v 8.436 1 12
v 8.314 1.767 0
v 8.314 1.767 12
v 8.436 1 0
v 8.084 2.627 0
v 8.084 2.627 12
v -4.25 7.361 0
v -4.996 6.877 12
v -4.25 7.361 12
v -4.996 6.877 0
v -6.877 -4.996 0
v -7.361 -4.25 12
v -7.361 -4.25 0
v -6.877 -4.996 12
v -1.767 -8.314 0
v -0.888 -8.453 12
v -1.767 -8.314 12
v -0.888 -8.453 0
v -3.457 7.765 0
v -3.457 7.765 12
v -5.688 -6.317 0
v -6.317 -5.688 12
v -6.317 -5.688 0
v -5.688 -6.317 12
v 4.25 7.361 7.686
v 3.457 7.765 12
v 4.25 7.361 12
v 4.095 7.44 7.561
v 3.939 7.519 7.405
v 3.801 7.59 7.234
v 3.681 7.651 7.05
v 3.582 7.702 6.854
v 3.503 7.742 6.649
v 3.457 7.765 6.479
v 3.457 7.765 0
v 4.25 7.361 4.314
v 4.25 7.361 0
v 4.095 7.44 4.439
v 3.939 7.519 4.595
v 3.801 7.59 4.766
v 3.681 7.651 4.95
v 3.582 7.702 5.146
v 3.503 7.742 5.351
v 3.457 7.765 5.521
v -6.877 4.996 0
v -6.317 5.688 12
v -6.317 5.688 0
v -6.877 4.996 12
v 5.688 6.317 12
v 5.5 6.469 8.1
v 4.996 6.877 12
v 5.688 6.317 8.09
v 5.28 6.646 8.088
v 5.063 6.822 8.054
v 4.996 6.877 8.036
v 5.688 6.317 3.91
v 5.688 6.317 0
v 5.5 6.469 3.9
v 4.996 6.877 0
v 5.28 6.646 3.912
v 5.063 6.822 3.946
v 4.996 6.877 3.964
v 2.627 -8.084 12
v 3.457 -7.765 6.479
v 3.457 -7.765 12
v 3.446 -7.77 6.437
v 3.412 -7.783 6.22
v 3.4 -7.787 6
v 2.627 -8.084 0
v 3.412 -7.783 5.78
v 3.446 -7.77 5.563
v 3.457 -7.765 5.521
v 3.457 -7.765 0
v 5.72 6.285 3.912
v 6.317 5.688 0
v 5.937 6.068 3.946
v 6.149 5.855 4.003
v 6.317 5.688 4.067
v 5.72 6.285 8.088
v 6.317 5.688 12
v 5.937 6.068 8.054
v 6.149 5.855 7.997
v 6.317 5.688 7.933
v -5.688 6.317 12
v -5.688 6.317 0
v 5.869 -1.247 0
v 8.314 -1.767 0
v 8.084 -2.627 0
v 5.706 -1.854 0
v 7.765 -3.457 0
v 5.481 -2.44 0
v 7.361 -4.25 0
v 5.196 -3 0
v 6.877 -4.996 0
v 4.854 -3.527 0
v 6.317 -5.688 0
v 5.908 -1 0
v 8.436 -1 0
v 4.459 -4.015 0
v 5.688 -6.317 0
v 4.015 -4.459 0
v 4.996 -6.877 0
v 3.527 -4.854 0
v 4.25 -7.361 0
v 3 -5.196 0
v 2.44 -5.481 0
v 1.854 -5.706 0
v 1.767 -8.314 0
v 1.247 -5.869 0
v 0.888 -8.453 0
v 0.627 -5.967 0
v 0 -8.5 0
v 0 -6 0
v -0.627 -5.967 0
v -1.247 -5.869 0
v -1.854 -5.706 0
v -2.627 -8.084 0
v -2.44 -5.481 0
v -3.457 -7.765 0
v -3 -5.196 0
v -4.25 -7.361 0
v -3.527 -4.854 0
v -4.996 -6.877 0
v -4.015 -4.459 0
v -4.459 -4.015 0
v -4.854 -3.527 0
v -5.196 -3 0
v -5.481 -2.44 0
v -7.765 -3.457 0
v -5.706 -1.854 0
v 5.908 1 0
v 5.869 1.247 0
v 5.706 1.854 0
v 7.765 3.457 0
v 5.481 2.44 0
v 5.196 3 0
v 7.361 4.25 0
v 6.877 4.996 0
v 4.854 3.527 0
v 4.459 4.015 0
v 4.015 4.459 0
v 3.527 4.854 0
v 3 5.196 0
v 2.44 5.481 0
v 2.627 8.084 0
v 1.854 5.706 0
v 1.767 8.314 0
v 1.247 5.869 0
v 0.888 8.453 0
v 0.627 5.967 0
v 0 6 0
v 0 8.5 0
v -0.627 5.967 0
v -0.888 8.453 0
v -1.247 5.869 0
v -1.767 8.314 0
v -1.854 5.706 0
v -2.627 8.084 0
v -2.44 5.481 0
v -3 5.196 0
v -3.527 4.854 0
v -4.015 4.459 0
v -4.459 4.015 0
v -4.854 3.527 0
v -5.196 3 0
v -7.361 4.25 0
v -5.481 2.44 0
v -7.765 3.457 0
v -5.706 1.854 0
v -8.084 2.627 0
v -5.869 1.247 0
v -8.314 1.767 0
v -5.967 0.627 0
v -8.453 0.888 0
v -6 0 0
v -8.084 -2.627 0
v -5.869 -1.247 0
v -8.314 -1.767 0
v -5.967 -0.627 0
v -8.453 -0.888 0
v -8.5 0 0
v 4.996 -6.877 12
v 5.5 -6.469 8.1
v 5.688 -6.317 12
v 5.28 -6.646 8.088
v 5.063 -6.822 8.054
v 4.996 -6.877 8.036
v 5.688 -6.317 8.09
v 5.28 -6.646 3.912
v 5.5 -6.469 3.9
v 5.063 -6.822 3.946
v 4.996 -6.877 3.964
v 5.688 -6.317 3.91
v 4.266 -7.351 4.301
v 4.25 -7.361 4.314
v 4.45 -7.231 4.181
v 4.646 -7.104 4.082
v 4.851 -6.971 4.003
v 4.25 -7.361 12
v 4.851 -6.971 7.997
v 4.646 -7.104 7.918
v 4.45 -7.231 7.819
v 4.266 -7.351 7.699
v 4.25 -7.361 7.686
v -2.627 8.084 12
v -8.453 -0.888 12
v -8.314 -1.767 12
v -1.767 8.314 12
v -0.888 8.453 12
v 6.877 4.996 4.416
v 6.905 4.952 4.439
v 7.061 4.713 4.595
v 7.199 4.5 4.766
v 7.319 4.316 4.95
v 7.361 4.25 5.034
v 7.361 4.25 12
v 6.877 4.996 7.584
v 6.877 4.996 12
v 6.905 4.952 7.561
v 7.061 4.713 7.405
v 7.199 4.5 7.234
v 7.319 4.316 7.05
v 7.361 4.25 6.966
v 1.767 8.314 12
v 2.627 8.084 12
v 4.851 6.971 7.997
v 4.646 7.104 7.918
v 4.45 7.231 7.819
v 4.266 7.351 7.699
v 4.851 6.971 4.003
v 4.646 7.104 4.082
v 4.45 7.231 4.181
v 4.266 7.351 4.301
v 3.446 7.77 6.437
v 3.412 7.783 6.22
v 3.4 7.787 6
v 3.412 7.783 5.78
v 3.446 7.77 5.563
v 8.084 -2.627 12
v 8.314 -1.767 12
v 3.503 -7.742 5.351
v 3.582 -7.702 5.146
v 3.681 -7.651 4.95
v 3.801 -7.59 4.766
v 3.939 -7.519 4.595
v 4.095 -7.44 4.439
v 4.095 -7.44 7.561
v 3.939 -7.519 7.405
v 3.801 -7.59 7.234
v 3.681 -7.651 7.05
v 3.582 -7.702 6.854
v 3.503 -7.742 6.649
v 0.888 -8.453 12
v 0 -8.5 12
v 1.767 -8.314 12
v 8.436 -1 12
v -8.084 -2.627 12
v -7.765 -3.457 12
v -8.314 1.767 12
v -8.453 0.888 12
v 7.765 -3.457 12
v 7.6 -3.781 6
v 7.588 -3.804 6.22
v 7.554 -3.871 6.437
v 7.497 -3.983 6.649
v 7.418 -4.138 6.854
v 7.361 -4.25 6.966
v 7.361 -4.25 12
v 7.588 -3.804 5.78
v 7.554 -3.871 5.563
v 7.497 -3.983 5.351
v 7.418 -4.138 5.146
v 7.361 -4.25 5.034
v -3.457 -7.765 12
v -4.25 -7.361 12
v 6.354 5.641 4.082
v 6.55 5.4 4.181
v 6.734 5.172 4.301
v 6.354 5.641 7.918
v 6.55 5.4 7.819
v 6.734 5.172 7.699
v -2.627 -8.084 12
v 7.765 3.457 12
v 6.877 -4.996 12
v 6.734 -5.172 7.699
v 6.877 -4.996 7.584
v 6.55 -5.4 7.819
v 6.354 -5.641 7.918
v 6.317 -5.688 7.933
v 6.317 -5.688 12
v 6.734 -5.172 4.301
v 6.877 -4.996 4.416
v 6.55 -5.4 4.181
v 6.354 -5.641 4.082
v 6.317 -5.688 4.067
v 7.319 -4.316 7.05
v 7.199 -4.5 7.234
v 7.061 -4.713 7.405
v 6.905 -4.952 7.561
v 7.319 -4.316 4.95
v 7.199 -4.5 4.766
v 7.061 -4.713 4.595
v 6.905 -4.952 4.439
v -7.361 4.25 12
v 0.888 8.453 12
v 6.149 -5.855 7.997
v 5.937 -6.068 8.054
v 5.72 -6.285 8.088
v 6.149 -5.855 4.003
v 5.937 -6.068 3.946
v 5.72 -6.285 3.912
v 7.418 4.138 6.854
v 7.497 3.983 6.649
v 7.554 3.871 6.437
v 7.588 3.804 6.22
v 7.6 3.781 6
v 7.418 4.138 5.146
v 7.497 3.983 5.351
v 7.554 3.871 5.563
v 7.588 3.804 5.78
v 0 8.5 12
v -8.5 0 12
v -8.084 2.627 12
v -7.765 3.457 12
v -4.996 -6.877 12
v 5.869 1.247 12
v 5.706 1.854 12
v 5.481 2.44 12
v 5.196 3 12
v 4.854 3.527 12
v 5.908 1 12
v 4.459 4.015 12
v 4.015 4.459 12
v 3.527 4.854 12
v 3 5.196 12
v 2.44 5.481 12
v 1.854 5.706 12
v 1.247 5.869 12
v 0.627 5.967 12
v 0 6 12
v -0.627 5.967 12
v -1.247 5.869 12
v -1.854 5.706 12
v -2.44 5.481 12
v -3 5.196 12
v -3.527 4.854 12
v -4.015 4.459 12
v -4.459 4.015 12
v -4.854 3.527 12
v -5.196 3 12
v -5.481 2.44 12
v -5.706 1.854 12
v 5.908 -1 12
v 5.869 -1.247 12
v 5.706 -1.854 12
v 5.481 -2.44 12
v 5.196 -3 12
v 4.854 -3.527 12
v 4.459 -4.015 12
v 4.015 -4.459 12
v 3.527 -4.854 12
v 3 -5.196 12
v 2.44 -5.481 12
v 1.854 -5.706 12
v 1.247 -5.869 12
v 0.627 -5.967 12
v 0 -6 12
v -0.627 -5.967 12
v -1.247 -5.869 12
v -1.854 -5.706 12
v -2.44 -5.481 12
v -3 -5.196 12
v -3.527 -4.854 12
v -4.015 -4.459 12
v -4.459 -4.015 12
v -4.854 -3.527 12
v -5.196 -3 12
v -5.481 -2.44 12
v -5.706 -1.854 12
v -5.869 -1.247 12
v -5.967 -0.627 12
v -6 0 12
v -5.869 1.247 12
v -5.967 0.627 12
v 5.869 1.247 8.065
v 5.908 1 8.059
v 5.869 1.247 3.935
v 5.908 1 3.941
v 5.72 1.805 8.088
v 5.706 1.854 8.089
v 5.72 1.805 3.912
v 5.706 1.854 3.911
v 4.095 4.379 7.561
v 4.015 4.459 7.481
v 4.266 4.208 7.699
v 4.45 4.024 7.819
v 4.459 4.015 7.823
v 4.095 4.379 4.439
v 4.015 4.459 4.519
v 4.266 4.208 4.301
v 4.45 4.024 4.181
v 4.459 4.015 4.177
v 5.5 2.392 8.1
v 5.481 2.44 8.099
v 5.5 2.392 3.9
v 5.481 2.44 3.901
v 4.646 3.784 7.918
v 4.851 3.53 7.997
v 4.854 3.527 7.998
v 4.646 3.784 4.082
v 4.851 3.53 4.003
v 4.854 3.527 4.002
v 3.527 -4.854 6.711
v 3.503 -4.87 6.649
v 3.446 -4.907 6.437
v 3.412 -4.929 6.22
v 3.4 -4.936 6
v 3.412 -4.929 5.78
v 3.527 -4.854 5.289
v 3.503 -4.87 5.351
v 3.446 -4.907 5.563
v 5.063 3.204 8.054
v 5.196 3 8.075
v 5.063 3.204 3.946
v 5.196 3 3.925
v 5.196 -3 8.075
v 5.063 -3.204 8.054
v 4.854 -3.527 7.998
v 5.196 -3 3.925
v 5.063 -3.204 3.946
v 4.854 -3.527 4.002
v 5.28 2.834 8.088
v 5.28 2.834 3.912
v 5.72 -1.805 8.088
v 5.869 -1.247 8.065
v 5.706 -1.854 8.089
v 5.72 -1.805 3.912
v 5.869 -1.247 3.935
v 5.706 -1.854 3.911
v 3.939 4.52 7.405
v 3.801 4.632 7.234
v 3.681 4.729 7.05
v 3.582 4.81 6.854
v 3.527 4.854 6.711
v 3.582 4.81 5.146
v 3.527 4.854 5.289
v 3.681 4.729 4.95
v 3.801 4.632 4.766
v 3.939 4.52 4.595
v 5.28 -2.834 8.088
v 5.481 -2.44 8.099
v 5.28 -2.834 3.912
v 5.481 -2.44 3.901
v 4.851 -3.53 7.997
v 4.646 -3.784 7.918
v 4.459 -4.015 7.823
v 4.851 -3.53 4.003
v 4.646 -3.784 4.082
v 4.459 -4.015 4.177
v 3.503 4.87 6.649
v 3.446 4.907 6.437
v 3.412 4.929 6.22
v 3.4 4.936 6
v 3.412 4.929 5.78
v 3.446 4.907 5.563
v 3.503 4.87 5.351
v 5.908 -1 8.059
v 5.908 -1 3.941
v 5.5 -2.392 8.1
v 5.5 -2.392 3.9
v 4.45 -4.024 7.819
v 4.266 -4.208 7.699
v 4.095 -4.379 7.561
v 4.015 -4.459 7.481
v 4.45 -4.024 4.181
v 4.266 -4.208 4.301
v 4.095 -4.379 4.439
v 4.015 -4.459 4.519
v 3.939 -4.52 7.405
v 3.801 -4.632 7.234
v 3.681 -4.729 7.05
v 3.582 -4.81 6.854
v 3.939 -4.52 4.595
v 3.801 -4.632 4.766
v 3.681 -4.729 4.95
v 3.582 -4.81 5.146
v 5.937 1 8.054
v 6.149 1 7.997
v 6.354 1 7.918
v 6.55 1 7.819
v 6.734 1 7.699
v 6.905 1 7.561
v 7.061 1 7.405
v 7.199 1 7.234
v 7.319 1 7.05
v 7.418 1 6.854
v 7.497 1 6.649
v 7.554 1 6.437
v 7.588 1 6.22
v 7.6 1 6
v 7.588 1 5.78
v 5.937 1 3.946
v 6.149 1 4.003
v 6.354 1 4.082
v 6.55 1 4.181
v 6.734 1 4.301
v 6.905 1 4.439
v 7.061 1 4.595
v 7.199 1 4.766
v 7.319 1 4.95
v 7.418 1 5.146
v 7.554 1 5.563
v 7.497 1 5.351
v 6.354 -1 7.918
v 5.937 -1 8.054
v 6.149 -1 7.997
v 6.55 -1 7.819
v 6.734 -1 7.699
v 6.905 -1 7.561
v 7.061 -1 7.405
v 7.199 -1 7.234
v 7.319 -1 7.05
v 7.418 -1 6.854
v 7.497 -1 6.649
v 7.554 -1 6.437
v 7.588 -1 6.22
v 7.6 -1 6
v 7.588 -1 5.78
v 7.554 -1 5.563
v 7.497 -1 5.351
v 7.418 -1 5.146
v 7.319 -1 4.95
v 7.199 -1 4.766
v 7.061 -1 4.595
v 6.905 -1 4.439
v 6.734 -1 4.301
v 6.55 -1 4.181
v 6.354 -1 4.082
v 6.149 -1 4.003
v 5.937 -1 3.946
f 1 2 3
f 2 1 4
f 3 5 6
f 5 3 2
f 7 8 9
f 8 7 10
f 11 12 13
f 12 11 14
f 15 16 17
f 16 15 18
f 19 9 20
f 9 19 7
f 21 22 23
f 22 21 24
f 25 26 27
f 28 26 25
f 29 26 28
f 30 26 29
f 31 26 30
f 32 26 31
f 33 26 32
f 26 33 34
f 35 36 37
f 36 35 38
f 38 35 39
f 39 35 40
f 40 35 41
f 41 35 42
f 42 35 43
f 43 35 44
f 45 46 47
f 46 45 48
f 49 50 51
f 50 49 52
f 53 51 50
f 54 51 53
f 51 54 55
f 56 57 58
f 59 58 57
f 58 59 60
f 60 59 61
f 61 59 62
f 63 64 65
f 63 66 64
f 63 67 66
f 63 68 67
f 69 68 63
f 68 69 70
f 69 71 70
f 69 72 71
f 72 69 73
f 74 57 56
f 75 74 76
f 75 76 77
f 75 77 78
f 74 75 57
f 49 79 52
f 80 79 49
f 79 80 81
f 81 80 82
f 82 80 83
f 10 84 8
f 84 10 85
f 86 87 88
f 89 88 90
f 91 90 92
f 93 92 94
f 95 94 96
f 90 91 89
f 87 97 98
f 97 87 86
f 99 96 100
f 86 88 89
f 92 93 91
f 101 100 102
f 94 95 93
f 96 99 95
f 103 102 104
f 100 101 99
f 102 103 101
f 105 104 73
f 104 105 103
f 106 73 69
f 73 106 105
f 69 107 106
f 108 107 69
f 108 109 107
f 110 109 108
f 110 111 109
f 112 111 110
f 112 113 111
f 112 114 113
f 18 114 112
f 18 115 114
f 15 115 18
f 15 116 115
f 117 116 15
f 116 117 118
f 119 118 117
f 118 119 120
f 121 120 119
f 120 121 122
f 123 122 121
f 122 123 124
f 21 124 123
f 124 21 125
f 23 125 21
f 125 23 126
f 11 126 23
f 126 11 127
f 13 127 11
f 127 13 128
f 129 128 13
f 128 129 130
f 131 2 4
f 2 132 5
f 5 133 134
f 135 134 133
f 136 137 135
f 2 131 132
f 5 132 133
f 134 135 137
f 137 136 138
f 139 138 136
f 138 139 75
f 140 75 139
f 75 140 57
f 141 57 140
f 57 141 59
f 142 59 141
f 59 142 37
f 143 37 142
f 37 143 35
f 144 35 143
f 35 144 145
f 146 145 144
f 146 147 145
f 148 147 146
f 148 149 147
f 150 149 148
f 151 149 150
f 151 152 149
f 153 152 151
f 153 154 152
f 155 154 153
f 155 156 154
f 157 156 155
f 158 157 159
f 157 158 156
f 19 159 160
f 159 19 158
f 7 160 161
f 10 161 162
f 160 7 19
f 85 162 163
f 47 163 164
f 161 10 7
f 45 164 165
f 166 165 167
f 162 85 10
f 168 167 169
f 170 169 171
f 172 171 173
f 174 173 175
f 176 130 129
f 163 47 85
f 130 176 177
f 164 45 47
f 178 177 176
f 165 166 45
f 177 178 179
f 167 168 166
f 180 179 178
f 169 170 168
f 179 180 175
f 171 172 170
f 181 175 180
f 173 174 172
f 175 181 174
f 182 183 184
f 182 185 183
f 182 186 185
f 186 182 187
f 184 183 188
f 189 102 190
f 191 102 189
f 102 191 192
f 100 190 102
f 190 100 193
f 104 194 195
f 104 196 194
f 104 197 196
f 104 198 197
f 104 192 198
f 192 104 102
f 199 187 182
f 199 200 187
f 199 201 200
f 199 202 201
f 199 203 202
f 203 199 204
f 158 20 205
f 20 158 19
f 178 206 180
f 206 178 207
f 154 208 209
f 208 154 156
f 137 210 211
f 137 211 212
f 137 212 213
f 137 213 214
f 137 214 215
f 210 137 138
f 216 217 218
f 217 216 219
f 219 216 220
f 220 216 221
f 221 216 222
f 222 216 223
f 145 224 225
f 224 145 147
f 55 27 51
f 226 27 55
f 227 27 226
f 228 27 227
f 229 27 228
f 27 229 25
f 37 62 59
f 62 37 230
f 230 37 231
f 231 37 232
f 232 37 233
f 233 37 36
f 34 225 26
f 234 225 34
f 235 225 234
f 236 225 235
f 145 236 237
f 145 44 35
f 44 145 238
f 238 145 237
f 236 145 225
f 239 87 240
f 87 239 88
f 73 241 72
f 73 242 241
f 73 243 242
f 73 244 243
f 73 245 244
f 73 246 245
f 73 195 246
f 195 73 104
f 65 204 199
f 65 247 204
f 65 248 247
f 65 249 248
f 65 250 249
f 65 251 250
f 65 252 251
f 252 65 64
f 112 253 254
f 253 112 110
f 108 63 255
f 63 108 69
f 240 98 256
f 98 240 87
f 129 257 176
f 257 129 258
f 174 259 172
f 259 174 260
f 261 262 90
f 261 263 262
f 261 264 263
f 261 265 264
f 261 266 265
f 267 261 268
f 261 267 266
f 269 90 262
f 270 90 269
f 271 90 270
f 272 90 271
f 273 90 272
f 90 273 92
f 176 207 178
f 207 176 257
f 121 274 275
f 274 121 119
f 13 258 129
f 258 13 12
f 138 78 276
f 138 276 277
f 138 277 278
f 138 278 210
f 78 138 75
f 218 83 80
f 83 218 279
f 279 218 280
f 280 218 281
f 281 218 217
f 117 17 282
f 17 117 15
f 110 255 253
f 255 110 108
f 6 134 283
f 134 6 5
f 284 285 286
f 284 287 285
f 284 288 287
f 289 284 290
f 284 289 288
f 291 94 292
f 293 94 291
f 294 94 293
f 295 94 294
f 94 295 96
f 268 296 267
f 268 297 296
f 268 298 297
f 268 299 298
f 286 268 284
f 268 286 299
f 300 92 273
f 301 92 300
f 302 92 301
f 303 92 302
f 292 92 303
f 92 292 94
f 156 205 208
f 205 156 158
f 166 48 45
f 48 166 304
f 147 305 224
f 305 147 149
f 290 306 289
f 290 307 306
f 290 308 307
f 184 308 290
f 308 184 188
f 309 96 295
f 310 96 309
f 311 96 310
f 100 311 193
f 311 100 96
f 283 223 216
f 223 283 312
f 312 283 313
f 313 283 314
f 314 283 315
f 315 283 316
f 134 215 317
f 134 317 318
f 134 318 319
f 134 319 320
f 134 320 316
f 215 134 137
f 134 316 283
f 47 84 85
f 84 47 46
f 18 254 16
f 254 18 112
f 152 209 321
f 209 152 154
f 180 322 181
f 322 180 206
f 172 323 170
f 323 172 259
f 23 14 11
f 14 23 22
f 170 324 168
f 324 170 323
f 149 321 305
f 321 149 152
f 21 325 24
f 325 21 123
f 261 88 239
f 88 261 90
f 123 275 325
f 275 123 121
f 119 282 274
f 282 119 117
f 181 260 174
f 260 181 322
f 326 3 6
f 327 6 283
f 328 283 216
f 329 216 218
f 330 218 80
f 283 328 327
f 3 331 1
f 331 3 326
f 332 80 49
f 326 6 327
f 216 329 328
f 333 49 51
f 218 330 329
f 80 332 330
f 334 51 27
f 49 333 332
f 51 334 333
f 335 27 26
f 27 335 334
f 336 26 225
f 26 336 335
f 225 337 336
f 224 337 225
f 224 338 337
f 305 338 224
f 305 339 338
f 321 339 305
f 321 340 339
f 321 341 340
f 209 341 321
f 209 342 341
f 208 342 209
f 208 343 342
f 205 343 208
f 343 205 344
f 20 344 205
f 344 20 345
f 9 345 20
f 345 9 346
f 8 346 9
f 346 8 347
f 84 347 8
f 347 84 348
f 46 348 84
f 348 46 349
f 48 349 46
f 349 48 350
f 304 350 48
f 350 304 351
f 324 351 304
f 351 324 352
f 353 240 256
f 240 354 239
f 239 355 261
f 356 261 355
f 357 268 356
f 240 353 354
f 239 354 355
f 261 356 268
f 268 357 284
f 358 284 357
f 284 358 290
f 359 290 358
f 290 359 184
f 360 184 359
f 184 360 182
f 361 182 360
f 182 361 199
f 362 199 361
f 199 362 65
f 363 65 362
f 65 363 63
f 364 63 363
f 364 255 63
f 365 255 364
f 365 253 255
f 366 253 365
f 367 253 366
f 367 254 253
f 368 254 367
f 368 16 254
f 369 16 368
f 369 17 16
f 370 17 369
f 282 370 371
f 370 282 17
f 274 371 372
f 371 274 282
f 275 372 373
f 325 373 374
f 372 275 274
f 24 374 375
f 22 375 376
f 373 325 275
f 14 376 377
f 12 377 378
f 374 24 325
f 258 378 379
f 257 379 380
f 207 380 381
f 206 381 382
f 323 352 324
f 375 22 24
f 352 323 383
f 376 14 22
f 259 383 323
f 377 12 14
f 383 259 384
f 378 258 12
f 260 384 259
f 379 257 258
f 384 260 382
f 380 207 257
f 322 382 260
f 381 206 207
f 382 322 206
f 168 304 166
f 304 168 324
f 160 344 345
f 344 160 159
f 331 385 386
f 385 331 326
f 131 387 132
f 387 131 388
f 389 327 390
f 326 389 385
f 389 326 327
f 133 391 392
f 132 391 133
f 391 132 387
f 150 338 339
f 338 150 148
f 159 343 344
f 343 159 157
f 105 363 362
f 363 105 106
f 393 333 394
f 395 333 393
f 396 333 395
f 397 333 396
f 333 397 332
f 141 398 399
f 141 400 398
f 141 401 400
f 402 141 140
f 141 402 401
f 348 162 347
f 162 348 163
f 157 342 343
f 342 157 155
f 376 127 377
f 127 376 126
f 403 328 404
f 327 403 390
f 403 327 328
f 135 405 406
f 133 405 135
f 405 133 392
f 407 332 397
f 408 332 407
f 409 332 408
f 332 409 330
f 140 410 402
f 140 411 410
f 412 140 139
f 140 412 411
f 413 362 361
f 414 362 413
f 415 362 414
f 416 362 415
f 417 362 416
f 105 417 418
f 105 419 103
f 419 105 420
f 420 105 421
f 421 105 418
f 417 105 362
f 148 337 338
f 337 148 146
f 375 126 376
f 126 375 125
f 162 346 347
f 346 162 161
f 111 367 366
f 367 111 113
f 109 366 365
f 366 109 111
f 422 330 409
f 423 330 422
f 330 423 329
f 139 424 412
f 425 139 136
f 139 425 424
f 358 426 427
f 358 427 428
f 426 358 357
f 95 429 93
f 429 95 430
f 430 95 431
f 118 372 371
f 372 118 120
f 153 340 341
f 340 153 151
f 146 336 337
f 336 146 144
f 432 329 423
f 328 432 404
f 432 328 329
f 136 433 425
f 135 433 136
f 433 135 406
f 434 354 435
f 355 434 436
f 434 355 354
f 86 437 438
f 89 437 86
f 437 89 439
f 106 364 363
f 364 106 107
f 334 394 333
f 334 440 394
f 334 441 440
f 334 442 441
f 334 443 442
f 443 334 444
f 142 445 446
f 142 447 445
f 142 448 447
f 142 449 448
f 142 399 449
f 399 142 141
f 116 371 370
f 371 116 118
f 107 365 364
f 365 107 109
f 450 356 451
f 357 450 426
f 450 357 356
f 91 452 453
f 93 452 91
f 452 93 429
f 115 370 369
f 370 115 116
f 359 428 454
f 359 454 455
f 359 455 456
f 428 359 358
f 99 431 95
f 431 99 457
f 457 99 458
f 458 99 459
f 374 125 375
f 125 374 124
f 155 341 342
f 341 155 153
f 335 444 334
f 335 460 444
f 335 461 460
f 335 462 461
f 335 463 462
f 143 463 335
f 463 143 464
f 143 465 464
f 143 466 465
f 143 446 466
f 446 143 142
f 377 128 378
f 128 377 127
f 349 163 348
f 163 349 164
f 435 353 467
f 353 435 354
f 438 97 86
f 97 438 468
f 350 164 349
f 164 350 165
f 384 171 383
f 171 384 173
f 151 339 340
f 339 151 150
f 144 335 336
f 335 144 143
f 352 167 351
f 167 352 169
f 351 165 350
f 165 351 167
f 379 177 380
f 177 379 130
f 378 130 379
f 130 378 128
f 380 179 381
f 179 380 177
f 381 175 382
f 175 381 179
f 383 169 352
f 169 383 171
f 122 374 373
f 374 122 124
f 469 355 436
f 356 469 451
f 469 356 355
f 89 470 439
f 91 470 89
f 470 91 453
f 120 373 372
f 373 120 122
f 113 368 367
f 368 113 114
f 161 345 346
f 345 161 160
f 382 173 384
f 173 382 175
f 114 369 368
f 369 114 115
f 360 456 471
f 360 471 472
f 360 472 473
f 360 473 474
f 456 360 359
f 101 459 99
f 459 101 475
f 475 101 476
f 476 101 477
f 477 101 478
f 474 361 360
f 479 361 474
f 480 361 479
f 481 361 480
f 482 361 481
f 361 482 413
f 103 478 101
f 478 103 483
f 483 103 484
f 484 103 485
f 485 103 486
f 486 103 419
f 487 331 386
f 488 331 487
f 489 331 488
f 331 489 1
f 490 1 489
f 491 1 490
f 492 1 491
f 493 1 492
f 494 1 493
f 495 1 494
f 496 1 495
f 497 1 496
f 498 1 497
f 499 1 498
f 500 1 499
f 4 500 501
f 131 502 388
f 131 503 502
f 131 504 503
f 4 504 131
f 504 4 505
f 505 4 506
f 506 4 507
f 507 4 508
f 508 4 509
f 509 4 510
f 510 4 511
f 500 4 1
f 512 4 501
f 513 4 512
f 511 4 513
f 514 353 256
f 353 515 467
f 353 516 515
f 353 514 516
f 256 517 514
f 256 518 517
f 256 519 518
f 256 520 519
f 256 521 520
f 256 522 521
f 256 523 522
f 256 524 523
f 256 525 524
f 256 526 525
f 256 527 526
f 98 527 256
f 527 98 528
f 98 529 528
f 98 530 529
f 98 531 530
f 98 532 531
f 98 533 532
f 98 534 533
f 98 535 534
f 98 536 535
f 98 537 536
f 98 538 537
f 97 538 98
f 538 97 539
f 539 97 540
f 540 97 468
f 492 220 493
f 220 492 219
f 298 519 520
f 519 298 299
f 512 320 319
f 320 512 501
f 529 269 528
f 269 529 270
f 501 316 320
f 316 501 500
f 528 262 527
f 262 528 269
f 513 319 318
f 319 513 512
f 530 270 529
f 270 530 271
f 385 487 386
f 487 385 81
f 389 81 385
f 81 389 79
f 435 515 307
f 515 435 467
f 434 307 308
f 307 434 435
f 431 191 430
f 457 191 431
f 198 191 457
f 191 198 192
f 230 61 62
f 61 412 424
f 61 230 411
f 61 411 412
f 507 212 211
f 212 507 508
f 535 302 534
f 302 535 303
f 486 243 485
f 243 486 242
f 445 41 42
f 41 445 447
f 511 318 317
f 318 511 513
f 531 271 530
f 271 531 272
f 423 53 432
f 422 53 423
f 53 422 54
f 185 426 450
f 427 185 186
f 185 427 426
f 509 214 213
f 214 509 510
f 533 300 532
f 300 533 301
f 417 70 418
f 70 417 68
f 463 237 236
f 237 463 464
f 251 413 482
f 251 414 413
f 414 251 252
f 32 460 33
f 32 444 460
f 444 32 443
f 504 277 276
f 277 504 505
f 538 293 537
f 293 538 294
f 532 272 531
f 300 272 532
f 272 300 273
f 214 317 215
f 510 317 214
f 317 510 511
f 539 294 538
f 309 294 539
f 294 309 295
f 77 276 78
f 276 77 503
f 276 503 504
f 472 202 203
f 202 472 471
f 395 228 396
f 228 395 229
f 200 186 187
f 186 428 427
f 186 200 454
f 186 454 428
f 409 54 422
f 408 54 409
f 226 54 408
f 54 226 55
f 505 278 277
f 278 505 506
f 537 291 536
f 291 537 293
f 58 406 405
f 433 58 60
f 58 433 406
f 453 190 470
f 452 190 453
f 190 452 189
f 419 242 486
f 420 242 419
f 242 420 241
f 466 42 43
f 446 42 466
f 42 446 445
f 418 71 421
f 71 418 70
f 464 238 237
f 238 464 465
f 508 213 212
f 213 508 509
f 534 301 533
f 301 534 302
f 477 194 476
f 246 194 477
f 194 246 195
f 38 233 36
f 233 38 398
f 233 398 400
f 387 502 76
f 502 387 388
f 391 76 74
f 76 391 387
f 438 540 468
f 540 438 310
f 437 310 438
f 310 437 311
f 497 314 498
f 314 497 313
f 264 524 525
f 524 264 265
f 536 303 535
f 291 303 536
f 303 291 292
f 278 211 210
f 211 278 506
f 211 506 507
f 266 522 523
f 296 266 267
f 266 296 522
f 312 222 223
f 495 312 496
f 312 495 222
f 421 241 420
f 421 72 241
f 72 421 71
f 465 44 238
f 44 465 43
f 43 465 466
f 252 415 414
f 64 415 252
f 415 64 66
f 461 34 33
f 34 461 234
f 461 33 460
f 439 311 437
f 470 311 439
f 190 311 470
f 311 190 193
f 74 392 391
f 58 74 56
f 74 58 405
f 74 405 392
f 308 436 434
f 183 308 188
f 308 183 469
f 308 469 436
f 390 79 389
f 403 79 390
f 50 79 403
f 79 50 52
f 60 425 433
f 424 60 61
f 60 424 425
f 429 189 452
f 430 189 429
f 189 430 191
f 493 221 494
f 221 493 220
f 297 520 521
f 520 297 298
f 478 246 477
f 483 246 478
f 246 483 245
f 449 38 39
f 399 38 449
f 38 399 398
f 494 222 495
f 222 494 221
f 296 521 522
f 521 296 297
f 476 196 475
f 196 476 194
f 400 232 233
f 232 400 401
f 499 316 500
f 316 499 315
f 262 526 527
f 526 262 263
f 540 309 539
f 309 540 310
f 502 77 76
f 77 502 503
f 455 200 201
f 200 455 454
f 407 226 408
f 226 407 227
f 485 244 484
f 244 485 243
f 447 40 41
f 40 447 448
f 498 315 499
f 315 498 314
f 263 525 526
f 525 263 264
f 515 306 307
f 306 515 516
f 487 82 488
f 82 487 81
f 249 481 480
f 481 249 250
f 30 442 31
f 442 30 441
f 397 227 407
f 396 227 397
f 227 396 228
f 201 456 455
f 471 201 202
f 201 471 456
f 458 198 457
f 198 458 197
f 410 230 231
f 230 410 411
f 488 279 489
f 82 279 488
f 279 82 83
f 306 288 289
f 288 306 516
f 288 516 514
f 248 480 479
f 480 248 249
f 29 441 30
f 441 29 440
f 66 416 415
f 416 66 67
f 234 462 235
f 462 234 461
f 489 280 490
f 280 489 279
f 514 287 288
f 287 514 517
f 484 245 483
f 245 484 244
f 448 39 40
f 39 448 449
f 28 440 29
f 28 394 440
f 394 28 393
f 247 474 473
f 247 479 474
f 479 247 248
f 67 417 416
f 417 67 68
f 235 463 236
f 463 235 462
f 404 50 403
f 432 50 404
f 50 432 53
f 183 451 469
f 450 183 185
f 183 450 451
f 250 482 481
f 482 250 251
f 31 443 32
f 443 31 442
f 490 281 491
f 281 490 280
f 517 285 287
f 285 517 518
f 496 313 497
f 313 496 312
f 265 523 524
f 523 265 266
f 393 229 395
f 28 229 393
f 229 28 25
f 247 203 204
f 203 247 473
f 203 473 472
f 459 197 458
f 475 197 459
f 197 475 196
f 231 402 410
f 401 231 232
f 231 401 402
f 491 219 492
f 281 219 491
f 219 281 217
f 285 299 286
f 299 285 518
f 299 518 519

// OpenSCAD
// C-style pipe clamp.
$fn = 60;
eps = 0.02;
pipe_d = 12;
wall = 2.5;
outer_d = pipe_d + 2 * wall;
width = 12;
slit = 2;
difference() {
    cylinder(d=outer_d,h=width);
    translate([0,0,-eps]) cylinder(d=pipe_d,h=width+2*eps);
    translate([0,-slit/2,-eps]) cube([outer_d/2+eps,slit,width+2*eps]);
    translate([outer_d/2-3,-outer_d/2-eps,width/2]) rotate([-90,0,0]) cylinder(d=4.2,h=outer_d+2*eps);
}
